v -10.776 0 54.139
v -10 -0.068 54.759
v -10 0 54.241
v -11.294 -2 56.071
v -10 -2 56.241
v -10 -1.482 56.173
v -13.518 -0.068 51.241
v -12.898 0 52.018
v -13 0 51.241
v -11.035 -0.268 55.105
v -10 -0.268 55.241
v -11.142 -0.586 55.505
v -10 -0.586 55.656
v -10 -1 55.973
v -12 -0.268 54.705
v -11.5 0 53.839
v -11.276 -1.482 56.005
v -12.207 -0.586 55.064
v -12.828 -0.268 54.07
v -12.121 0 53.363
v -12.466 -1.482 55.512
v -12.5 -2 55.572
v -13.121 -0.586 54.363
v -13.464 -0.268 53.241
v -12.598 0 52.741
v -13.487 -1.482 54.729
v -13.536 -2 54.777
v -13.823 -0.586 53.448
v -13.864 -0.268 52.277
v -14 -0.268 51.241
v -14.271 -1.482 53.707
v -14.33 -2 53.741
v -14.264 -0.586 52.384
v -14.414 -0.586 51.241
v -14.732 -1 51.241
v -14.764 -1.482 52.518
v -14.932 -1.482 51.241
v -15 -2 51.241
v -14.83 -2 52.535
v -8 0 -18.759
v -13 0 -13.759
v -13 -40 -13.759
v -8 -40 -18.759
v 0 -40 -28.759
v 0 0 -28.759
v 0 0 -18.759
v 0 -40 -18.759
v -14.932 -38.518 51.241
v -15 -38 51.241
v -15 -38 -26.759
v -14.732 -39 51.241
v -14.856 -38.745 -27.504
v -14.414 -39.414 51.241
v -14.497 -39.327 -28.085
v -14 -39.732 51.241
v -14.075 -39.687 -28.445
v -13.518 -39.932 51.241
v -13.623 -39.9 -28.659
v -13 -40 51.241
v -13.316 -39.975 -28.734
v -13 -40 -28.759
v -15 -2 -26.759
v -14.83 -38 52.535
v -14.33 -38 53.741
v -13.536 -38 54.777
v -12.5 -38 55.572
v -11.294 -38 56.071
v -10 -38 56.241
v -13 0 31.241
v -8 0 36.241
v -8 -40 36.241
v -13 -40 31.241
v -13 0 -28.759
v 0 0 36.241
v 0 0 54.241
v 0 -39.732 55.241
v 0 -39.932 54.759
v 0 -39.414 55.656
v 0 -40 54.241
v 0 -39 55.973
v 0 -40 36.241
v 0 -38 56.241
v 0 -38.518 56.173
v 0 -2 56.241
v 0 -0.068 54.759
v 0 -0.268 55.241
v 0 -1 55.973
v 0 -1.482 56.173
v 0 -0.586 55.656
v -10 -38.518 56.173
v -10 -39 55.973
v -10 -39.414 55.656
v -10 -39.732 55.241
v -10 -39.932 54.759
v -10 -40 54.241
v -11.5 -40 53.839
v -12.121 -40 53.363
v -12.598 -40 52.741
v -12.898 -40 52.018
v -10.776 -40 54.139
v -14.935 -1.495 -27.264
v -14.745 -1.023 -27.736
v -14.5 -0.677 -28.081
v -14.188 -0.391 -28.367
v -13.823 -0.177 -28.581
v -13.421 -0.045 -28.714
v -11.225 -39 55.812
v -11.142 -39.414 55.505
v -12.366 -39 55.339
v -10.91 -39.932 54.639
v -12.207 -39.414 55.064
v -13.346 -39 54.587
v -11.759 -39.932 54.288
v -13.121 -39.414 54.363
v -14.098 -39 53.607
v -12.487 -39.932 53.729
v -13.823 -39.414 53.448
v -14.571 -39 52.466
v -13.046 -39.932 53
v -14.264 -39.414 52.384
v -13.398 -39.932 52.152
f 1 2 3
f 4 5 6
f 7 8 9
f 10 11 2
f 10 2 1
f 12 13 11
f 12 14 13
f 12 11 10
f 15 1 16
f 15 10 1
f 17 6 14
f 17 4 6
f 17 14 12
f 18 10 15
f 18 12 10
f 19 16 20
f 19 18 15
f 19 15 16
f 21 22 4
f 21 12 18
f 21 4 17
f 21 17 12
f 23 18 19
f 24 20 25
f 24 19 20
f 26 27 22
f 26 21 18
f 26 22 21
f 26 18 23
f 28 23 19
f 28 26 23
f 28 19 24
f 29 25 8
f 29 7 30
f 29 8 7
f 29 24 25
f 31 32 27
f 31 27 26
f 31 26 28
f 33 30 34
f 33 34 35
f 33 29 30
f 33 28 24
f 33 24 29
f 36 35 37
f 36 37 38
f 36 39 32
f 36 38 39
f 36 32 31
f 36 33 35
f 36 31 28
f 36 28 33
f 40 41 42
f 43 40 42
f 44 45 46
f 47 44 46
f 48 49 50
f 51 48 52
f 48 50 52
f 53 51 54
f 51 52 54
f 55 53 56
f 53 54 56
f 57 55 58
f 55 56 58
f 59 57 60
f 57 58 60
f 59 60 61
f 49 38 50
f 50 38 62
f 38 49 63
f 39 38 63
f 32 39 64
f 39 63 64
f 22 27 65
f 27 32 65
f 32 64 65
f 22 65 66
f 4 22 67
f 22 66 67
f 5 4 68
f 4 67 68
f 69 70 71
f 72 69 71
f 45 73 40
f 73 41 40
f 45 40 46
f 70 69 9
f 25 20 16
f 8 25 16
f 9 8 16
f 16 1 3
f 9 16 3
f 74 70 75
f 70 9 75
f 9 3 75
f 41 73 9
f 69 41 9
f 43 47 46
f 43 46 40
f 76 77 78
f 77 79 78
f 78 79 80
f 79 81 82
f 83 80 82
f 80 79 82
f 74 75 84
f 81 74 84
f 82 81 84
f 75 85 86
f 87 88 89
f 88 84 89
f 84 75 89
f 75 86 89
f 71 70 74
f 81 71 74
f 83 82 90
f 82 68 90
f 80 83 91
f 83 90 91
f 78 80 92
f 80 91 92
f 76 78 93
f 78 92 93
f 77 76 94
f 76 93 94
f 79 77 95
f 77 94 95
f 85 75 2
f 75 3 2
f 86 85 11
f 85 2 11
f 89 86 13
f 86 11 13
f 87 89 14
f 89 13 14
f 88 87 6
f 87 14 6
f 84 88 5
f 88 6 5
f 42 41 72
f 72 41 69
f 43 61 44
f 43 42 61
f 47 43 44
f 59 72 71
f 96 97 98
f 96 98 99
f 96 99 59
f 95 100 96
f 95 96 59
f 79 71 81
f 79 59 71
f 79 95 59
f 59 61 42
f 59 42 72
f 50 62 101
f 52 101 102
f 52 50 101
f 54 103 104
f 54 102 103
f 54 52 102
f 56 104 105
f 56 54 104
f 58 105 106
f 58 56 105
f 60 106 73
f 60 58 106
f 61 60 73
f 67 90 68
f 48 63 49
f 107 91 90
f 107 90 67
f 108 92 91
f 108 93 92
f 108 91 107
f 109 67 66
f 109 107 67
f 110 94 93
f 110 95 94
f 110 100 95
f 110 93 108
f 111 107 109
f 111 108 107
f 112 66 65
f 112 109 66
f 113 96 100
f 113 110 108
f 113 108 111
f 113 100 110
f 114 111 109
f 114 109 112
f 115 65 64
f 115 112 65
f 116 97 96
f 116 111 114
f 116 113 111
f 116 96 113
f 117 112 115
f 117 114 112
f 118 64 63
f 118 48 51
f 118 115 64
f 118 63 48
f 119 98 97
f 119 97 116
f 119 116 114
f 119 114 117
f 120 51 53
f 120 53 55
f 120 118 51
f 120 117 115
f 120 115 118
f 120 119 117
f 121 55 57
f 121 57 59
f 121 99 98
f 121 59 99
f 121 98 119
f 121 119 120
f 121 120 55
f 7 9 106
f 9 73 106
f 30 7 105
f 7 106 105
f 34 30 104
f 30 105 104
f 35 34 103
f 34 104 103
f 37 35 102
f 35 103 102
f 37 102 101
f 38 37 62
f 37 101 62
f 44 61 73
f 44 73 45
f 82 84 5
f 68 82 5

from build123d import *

# Parameters (mm, degrees)
F1_DEPTH = 40
F2_SIZE  = 5
F3_R     = 5
F4_R     = 1.99999


# Not quite as in the source:
# - a fillet or chamfer is up to 0.001 mm smaller than in the source, because OpenCascade refuses the exact size


with BuildPart() as f1:
    # F0 (on Front) → F1 (new body)
    with BuildSketch(Plane.XZ):
        Polygon((-13, 36.2413817516), (-15, 36.2413817516), (-15, -28.7586182484), (0, -28.7586182484), (0, -18.7586182484), (-13, -18.7586182484), align=None)
        Polygon((0, 36.2413817516), (0, 56.2413817516), (-15, 56.2413817516), (-15, 36.2413817516), (-13, 36.2413817516), align=None)
    extrude(amount=F1_DEPTH)

    # F2
    f2_edges = [f1.edges().sort_by_distance(p)[0] for p in [
        (-13, -20, -18.758618),
        (-13, -20, 36.241382),
    ]]
    chamfer(f2_edges, length=F2_SIZE)

    # F3
    f3_edges = [f1.edges().sort_by_distance(p)[0] for p in [
        (-15, -20, 56.241382),
    ]]
    fillet(f3_edges, radius=F3_R)

    # F4 (radius 2 in the source; OpenCascade refuses exactly that, so slightly less here)
    f4_edges = [f1.edges().sort_by_distance(p)[0] for p in [
        (-15, 0, 11.241382),
        (-15, -20, 51.241382),
        (-15, -20, -28.758618),
        (-15, -40, 11.241382),
    ]]
    fillet(f4_edges, radius=F4_R)


solid = f1.part
